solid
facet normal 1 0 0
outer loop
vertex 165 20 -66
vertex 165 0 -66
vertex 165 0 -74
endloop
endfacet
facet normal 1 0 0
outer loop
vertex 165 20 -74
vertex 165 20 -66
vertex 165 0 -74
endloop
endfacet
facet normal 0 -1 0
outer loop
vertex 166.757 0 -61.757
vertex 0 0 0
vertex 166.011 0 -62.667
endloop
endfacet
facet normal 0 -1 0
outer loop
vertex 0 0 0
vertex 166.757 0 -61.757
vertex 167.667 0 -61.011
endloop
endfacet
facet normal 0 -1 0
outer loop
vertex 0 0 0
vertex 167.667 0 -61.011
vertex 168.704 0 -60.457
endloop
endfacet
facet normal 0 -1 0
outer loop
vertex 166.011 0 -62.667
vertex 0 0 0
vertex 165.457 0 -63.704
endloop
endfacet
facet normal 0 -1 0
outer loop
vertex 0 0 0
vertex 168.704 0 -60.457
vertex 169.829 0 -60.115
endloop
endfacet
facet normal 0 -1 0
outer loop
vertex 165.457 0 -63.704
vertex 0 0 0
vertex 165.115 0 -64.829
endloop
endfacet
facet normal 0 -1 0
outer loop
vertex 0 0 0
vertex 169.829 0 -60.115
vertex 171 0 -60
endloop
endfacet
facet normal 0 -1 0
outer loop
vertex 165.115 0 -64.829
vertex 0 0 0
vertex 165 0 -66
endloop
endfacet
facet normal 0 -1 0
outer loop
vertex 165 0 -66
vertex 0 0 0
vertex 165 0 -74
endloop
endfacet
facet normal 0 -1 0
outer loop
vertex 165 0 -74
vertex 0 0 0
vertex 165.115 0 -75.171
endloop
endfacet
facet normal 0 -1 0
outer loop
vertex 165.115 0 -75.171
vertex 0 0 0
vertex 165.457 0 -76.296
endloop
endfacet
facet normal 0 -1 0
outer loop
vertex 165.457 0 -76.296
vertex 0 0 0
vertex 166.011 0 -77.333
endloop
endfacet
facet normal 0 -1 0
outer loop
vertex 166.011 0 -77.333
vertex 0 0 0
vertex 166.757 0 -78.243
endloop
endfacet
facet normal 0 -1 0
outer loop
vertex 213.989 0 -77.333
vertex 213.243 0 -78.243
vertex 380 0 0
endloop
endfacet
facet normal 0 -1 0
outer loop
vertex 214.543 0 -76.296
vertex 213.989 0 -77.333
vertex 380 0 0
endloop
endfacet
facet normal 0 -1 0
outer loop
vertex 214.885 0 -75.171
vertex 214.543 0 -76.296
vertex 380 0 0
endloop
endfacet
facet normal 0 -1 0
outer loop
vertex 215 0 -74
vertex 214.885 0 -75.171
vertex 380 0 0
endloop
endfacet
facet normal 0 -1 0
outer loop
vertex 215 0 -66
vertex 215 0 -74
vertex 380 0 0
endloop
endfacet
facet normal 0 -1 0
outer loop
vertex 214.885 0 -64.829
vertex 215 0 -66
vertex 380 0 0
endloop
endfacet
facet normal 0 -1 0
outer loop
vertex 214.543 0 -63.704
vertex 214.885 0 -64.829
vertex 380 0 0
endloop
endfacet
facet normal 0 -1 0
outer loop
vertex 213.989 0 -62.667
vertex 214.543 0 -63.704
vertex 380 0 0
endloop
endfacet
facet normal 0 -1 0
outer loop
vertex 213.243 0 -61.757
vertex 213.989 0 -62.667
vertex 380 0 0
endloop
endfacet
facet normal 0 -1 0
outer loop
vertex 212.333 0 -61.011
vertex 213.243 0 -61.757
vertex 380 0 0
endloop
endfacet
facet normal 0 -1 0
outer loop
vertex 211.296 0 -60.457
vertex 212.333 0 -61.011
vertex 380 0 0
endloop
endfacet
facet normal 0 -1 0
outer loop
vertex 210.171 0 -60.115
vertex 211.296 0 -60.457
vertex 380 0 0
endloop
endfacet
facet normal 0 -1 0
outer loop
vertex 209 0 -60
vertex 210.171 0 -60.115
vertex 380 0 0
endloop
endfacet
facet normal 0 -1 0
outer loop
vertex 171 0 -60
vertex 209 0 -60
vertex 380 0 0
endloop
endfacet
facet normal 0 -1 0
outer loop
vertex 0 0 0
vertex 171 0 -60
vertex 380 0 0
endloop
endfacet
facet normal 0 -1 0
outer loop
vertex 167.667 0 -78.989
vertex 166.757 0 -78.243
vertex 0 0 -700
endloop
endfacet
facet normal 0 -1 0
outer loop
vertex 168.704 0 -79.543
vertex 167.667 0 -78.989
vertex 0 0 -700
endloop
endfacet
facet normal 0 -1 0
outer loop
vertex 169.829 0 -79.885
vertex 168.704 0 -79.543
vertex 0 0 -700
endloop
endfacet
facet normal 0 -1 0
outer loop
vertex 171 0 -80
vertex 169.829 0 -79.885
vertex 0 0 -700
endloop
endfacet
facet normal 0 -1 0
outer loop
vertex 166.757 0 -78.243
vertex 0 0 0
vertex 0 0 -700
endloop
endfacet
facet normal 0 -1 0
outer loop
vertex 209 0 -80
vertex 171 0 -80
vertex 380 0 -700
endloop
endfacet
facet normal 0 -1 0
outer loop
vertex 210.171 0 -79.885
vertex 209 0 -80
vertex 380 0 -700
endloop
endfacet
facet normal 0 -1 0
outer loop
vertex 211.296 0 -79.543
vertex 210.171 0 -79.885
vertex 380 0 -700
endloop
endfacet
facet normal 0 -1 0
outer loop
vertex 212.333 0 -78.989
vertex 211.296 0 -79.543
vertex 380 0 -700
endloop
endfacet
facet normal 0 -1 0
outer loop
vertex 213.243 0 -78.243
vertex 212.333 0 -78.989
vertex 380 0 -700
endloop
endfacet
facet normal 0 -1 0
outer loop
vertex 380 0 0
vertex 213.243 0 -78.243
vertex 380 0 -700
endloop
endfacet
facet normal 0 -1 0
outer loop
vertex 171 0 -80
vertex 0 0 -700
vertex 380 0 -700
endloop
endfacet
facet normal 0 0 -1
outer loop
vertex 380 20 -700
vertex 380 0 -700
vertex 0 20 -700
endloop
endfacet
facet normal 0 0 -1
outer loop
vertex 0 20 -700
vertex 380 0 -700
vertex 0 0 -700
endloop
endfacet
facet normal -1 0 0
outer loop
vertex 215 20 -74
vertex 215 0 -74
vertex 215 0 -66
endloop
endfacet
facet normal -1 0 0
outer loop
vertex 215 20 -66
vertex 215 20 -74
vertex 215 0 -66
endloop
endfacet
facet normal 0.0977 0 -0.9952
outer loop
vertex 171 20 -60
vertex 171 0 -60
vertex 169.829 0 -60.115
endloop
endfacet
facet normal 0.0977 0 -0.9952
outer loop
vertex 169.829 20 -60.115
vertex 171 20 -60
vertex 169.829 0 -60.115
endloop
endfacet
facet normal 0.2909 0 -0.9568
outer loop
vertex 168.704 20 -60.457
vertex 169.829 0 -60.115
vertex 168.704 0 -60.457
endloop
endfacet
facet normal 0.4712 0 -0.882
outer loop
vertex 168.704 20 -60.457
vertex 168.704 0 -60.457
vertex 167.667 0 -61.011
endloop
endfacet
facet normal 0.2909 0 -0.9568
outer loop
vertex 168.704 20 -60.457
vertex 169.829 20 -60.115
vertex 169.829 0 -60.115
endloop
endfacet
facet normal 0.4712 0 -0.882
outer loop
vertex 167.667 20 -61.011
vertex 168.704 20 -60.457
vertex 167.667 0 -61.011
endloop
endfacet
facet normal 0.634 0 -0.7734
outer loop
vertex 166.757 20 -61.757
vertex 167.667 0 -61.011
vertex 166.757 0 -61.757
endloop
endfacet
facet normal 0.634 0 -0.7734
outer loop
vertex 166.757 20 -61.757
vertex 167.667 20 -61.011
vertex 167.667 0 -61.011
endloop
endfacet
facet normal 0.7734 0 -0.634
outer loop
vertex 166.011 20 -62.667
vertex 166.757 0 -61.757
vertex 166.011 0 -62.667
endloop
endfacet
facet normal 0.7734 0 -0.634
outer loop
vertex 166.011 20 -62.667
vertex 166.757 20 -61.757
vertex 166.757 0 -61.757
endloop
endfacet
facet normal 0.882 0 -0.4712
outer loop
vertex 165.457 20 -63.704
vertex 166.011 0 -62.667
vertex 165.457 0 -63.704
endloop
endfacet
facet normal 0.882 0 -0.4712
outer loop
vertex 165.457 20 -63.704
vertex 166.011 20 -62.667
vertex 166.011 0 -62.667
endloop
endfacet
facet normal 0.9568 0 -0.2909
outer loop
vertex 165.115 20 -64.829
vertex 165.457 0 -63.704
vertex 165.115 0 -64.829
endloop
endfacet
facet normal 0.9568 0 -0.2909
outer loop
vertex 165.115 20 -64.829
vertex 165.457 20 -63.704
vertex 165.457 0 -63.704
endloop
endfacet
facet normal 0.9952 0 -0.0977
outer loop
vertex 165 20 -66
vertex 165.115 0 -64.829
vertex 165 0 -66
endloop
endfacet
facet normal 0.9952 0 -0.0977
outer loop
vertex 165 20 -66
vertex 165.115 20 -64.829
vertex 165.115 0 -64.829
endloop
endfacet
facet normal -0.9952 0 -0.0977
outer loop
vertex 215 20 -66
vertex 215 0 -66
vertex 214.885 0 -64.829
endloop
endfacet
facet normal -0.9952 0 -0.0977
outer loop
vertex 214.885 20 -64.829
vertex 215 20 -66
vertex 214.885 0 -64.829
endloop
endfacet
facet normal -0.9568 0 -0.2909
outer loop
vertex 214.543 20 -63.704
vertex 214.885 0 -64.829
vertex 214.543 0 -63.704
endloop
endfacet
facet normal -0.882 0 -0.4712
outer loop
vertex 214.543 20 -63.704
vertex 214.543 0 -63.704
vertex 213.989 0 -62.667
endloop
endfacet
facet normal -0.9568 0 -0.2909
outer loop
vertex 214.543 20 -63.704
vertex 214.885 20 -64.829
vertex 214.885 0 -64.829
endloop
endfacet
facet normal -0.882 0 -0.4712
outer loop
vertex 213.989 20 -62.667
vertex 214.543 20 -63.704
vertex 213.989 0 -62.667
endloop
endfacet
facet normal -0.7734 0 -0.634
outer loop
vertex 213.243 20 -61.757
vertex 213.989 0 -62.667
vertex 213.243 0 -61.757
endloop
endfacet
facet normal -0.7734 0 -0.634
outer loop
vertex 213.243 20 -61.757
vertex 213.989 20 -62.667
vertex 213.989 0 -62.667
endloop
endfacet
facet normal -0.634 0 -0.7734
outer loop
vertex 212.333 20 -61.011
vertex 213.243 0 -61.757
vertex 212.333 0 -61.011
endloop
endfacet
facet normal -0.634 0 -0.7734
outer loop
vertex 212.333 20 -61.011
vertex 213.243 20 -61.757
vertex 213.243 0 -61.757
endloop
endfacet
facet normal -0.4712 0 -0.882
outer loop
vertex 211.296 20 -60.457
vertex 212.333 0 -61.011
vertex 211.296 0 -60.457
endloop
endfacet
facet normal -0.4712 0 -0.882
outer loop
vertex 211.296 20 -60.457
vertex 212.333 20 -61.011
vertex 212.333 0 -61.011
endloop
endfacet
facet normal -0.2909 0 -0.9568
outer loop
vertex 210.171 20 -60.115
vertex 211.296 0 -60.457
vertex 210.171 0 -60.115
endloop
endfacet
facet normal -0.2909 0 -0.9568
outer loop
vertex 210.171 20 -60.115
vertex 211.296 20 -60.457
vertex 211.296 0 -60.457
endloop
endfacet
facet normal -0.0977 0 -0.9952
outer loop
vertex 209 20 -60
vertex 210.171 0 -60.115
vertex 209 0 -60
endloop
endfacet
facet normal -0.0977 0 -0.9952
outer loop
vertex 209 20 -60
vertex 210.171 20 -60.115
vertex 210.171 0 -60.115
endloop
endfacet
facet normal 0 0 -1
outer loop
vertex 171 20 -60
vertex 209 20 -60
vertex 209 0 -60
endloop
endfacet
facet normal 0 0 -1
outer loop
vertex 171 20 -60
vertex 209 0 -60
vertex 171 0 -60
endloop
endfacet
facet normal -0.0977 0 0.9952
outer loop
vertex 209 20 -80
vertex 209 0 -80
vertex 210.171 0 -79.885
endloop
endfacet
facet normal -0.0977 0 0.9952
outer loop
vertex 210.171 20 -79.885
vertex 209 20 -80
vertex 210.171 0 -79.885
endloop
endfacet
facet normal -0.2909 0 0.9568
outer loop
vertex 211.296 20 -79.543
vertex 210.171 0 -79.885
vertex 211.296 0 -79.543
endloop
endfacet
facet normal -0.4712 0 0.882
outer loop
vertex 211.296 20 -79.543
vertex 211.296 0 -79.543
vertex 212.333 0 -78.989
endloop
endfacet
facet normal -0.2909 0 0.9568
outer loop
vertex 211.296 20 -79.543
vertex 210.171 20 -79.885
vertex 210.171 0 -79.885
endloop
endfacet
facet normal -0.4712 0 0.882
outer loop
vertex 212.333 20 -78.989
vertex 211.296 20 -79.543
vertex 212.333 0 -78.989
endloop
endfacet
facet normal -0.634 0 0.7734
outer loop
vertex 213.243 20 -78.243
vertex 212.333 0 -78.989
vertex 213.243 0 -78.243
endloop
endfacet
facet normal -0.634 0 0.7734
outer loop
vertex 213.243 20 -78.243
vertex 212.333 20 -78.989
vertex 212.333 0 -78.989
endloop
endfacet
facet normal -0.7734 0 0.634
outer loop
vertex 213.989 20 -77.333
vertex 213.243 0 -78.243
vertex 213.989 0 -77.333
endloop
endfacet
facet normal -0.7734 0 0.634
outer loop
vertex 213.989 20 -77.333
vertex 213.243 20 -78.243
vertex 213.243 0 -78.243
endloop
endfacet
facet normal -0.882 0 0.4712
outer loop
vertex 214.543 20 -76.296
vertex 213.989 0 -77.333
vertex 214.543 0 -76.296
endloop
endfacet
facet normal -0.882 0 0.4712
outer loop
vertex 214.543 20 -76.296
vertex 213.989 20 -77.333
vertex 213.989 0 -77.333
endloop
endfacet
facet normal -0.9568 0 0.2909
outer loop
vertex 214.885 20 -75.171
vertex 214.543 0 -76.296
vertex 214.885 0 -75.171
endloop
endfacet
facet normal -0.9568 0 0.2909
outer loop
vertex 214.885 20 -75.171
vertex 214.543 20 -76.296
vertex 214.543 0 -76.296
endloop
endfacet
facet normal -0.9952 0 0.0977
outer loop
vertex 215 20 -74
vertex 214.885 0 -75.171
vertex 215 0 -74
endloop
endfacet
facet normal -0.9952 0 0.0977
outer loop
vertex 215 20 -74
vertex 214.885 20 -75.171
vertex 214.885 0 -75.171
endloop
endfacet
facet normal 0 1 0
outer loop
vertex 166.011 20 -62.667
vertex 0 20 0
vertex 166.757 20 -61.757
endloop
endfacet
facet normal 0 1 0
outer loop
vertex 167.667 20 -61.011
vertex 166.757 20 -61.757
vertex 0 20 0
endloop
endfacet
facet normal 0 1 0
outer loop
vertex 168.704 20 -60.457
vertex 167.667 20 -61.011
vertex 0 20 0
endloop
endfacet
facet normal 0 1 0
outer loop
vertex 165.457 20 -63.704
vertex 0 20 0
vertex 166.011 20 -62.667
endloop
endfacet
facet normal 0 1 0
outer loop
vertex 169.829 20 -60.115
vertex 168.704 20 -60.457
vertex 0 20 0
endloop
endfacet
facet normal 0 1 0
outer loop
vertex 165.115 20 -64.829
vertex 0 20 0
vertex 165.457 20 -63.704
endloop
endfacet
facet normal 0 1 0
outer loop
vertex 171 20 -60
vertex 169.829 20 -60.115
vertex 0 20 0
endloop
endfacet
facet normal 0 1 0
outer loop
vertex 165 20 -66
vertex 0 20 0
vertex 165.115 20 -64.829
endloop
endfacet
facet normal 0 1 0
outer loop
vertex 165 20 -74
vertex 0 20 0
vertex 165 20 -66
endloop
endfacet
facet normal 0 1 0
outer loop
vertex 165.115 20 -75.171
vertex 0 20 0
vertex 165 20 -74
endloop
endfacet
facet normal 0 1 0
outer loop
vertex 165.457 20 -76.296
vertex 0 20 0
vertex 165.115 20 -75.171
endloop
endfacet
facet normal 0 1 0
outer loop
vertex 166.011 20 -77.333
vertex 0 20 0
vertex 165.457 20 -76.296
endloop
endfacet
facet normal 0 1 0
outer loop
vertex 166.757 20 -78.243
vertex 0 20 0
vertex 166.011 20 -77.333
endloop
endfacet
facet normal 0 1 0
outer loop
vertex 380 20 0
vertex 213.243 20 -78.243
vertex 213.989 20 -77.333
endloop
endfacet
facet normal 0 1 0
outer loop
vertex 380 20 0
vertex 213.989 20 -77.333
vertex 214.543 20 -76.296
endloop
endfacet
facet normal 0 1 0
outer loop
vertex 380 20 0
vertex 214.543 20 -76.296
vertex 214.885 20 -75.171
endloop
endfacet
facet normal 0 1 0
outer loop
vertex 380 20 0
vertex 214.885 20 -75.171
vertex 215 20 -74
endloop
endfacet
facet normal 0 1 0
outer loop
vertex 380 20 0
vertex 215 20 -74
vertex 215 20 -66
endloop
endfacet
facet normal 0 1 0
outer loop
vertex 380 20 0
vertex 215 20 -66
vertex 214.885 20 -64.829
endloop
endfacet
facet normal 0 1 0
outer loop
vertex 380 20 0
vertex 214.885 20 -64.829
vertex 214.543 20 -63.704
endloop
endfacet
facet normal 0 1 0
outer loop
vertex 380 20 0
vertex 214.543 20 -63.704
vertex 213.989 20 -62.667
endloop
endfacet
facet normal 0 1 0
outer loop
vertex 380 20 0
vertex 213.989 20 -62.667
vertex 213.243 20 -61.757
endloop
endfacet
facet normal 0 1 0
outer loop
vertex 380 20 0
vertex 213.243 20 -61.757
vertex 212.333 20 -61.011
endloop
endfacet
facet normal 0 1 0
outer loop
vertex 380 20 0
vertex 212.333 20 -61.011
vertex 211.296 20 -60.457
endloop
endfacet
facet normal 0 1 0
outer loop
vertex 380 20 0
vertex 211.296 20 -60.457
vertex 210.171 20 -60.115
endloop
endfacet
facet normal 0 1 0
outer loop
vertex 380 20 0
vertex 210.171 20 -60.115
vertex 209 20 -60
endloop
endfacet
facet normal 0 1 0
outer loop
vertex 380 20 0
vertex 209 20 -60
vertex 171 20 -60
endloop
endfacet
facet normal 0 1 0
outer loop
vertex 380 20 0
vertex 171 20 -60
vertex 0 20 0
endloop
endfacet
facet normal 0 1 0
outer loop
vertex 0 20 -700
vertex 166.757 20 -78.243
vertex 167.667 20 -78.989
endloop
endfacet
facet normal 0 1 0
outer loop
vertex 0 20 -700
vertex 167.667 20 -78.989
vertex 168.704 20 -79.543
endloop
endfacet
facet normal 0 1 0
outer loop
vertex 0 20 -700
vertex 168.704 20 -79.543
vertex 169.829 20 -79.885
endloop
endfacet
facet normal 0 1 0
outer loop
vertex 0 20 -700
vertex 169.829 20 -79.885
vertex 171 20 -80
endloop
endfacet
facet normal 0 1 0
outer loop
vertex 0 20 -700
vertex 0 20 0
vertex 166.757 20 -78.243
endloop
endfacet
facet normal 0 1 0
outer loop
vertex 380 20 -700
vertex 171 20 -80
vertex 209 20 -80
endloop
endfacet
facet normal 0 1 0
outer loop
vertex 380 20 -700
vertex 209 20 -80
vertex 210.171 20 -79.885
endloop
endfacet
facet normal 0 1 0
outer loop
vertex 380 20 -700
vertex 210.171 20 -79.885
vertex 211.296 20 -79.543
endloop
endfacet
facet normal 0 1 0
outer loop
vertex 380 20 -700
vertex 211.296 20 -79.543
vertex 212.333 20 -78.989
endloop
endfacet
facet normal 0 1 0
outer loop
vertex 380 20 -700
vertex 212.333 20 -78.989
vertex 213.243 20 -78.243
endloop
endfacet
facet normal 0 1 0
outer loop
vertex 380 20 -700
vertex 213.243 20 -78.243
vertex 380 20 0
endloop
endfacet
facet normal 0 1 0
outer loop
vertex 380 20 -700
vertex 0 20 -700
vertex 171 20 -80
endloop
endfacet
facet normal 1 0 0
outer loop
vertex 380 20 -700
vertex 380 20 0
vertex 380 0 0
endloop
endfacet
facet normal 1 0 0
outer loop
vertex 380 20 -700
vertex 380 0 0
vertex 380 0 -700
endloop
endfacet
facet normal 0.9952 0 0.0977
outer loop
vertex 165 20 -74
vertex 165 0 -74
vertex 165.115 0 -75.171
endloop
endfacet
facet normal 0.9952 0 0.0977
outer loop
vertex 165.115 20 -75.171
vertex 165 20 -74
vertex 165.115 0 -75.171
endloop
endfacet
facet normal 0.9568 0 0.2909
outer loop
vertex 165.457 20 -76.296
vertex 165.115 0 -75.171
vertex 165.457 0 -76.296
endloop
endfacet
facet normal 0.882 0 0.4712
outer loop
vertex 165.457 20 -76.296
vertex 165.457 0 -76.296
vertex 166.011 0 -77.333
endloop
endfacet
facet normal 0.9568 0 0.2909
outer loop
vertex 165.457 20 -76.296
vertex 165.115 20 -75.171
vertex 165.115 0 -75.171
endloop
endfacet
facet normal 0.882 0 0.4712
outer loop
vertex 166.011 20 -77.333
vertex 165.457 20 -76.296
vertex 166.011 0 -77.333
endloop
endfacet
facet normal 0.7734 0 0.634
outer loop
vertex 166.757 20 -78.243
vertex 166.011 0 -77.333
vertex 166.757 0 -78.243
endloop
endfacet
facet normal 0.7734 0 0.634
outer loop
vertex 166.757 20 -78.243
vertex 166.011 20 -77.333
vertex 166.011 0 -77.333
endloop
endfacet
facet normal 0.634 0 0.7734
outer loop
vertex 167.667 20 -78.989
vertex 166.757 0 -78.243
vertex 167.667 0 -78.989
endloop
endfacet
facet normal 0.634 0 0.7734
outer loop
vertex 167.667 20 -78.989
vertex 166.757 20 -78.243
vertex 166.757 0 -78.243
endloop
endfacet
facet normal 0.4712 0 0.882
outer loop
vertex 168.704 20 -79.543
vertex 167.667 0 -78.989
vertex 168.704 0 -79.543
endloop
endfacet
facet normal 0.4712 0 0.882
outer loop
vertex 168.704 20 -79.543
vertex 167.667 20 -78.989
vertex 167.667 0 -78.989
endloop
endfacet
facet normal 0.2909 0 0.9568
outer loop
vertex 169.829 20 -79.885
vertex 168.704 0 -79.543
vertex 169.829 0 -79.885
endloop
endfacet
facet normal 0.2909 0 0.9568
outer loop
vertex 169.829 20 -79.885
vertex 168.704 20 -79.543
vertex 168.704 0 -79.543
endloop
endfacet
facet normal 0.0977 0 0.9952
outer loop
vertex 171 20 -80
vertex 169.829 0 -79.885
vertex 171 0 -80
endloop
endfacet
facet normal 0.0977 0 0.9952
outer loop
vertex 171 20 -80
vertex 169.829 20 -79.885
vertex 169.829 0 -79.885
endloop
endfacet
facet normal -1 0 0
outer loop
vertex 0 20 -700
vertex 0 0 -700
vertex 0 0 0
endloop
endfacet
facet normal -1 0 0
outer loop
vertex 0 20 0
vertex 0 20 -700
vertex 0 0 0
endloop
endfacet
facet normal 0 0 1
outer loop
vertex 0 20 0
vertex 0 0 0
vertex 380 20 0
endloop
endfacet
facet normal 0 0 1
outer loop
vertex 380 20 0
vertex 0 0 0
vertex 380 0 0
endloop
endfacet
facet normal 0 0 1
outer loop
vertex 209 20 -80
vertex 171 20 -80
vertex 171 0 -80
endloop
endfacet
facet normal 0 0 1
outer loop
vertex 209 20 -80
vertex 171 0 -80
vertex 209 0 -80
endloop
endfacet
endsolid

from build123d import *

# Parameters (mm, degrees)
EXTRUDE_1_DEPTH     = 20
SKETCH_2_W          = 336
SKETCH_2_H          = 230
CUT_EXTRUDE_1_DEPTH = 20
CUT_EXTRUDE_2_DEPTH = 20


with BuildPart() as part:
    # 草图1 → 凸台-拉伸1 (new body)
    with BuildSketch(Plane(origin=(0, 0, 0), x_dir=(1, 0, 0), z_dir=(0, 1, 0))):
        Polygon((0, 0), (380, 0), (716, 0), (716, 230), (380, 230), (380, 700), (0, 700), align=None)
    extrude(amount=EXTRUDE_1_DEPTH)

    # 草图2 → 切除-拉伸1 (cut)
    with BuildSketch(Plane(origin=(0, 20, 0), x_dir=(1, 0, 0), z_dir=(0, 1, 0))):
        with Locations((548, 115)):
            Rectangle(SKETCH_2_W, SKETCH_2_H)
    extrude(amount=-CUT_EXTRUDE_1_DEPTH, mode=Mode.SUBTRACT)

    # 草图3 → 切除-拉伸2 (cut)
    with BuildSketch(Plane(origin=(0, 20, 0), x_dir=(1, 0, 0), z_dir=(0, 1, 0))):
        with BuildLine():
            Line((171, 80), (209, 80))
            ThreePointArc((209, 80), (213.242640687, 78.242640687), (215, 74))
            Line((215, 74), (215, 66))
            ThreePointArc((215, 66), (213.242640687, 61.757359313), (209, 60))
            Line((209, 60), (171, 60))
            ThreePointArc((171, 60), (166.757359313, 61.757359313), (165, 66))
            Line((165, 66), (165, 74))
            ThreePointArc((165, 74), (166.757359313, 78.242640687), (171, 80))
        make_face()
    extrude(amount=-CUT_EXTRUDE_2_DEPTH, mode=Mode.SUBTRACT)


solid = part.part
